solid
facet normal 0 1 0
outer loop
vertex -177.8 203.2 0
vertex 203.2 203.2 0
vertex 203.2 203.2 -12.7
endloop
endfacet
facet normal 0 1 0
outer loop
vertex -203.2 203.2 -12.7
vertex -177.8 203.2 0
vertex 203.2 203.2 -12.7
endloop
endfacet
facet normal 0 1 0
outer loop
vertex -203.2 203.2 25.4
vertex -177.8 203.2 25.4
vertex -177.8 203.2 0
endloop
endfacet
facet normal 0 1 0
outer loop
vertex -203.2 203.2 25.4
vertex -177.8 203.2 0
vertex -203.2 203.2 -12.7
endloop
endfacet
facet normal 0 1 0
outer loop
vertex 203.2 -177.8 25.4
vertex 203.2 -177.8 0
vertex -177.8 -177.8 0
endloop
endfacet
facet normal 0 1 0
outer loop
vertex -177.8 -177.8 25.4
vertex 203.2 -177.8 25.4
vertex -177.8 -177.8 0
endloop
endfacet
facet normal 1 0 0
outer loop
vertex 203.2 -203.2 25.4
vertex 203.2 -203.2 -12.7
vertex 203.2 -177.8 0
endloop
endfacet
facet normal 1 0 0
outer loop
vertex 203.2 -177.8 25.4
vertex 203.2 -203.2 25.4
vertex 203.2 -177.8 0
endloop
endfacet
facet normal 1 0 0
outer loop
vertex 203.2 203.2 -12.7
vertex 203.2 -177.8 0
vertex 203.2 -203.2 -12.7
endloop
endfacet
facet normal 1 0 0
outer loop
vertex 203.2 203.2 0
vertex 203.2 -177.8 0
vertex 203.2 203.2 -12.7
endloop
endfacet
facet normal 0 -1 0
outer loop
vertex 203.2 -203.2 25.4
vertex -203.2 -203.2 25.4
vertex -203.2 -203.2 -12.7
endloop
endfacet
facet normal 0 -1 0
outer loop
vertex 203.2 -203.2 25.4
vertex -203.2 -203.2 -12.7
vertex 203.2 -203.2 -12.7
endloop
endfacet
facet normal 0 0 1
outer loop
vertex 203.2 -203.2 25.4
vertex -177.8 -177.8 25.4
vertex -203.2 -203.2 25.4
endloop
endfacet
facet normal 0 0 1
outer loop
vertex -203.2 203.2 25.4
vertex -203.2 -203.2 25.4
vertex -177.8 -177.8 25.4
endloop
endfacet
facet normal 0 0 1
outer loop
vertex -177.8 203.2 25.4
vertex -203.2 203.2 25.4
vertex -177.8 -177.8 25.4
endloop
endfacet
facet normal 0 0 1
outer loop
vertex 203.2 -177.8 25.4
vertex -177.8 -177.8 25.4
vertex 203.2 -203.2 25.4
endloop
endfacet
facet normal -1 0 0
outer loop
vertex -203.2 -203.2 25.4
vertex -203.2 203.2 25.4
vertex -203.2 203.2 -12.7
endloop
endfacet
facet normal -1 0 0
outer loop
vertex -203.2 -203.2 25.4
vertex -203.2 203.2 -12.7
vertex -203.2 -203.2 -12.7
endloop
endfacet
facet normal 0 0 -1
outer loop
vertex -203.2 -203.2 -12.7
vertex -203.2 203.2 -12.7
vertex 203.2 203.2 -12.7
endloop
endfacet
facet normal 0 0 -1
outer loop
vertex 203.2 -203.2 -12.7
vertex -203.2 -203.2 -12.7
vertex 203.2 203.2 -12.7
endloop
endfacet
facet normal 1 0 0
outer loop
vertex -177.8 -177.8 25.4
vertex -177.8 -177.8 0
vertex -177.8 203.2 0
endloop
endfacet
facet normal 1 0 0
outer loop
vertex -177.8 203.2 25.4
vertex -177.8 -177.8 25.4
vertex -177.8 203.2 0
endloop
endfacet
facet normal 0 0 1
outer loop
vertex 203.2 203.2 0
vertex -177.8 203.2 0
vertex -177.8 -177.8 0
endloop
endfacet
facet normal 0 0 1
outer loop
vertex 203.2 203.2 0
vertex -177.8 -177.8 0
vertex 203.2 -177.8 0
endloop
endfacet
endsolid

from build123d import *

# Parameters (mm, degrees)
BOSS_EXTRUDE1_DEPTH = 25.4
SKETCH1_3_W         = 406.4
SKETCH1_3_H         = 406.4
BOSS_EXTRUDE2_DEPTH = 12.7


with BuildPart() as part:
    # Sketch1 → Boss-Extrude1 (new body)
    with BuildSketch(Plane.XY):
        Polygon((-177.8, -177.8), (-177.8, 177.8), (-177.8, 203.2), (-203.2, 203.2), (-203.2, -203.2), (203.2, -203.2), (203.2, -177.8), (177.8, -177.8), align=None)
    extrude(amount=BOSS_EXTRUDE1_DEPTH)

    # Sketch1<3> → Boss-Extrude2 (add)
    with BuildSketch(Plane.XY):
        Rectangle(SKETCH1_3_W, SKETCH1_3_H)
    extrude(amount=-BOSS_EXTRUDE2_DEPTH)


solid = part.part
